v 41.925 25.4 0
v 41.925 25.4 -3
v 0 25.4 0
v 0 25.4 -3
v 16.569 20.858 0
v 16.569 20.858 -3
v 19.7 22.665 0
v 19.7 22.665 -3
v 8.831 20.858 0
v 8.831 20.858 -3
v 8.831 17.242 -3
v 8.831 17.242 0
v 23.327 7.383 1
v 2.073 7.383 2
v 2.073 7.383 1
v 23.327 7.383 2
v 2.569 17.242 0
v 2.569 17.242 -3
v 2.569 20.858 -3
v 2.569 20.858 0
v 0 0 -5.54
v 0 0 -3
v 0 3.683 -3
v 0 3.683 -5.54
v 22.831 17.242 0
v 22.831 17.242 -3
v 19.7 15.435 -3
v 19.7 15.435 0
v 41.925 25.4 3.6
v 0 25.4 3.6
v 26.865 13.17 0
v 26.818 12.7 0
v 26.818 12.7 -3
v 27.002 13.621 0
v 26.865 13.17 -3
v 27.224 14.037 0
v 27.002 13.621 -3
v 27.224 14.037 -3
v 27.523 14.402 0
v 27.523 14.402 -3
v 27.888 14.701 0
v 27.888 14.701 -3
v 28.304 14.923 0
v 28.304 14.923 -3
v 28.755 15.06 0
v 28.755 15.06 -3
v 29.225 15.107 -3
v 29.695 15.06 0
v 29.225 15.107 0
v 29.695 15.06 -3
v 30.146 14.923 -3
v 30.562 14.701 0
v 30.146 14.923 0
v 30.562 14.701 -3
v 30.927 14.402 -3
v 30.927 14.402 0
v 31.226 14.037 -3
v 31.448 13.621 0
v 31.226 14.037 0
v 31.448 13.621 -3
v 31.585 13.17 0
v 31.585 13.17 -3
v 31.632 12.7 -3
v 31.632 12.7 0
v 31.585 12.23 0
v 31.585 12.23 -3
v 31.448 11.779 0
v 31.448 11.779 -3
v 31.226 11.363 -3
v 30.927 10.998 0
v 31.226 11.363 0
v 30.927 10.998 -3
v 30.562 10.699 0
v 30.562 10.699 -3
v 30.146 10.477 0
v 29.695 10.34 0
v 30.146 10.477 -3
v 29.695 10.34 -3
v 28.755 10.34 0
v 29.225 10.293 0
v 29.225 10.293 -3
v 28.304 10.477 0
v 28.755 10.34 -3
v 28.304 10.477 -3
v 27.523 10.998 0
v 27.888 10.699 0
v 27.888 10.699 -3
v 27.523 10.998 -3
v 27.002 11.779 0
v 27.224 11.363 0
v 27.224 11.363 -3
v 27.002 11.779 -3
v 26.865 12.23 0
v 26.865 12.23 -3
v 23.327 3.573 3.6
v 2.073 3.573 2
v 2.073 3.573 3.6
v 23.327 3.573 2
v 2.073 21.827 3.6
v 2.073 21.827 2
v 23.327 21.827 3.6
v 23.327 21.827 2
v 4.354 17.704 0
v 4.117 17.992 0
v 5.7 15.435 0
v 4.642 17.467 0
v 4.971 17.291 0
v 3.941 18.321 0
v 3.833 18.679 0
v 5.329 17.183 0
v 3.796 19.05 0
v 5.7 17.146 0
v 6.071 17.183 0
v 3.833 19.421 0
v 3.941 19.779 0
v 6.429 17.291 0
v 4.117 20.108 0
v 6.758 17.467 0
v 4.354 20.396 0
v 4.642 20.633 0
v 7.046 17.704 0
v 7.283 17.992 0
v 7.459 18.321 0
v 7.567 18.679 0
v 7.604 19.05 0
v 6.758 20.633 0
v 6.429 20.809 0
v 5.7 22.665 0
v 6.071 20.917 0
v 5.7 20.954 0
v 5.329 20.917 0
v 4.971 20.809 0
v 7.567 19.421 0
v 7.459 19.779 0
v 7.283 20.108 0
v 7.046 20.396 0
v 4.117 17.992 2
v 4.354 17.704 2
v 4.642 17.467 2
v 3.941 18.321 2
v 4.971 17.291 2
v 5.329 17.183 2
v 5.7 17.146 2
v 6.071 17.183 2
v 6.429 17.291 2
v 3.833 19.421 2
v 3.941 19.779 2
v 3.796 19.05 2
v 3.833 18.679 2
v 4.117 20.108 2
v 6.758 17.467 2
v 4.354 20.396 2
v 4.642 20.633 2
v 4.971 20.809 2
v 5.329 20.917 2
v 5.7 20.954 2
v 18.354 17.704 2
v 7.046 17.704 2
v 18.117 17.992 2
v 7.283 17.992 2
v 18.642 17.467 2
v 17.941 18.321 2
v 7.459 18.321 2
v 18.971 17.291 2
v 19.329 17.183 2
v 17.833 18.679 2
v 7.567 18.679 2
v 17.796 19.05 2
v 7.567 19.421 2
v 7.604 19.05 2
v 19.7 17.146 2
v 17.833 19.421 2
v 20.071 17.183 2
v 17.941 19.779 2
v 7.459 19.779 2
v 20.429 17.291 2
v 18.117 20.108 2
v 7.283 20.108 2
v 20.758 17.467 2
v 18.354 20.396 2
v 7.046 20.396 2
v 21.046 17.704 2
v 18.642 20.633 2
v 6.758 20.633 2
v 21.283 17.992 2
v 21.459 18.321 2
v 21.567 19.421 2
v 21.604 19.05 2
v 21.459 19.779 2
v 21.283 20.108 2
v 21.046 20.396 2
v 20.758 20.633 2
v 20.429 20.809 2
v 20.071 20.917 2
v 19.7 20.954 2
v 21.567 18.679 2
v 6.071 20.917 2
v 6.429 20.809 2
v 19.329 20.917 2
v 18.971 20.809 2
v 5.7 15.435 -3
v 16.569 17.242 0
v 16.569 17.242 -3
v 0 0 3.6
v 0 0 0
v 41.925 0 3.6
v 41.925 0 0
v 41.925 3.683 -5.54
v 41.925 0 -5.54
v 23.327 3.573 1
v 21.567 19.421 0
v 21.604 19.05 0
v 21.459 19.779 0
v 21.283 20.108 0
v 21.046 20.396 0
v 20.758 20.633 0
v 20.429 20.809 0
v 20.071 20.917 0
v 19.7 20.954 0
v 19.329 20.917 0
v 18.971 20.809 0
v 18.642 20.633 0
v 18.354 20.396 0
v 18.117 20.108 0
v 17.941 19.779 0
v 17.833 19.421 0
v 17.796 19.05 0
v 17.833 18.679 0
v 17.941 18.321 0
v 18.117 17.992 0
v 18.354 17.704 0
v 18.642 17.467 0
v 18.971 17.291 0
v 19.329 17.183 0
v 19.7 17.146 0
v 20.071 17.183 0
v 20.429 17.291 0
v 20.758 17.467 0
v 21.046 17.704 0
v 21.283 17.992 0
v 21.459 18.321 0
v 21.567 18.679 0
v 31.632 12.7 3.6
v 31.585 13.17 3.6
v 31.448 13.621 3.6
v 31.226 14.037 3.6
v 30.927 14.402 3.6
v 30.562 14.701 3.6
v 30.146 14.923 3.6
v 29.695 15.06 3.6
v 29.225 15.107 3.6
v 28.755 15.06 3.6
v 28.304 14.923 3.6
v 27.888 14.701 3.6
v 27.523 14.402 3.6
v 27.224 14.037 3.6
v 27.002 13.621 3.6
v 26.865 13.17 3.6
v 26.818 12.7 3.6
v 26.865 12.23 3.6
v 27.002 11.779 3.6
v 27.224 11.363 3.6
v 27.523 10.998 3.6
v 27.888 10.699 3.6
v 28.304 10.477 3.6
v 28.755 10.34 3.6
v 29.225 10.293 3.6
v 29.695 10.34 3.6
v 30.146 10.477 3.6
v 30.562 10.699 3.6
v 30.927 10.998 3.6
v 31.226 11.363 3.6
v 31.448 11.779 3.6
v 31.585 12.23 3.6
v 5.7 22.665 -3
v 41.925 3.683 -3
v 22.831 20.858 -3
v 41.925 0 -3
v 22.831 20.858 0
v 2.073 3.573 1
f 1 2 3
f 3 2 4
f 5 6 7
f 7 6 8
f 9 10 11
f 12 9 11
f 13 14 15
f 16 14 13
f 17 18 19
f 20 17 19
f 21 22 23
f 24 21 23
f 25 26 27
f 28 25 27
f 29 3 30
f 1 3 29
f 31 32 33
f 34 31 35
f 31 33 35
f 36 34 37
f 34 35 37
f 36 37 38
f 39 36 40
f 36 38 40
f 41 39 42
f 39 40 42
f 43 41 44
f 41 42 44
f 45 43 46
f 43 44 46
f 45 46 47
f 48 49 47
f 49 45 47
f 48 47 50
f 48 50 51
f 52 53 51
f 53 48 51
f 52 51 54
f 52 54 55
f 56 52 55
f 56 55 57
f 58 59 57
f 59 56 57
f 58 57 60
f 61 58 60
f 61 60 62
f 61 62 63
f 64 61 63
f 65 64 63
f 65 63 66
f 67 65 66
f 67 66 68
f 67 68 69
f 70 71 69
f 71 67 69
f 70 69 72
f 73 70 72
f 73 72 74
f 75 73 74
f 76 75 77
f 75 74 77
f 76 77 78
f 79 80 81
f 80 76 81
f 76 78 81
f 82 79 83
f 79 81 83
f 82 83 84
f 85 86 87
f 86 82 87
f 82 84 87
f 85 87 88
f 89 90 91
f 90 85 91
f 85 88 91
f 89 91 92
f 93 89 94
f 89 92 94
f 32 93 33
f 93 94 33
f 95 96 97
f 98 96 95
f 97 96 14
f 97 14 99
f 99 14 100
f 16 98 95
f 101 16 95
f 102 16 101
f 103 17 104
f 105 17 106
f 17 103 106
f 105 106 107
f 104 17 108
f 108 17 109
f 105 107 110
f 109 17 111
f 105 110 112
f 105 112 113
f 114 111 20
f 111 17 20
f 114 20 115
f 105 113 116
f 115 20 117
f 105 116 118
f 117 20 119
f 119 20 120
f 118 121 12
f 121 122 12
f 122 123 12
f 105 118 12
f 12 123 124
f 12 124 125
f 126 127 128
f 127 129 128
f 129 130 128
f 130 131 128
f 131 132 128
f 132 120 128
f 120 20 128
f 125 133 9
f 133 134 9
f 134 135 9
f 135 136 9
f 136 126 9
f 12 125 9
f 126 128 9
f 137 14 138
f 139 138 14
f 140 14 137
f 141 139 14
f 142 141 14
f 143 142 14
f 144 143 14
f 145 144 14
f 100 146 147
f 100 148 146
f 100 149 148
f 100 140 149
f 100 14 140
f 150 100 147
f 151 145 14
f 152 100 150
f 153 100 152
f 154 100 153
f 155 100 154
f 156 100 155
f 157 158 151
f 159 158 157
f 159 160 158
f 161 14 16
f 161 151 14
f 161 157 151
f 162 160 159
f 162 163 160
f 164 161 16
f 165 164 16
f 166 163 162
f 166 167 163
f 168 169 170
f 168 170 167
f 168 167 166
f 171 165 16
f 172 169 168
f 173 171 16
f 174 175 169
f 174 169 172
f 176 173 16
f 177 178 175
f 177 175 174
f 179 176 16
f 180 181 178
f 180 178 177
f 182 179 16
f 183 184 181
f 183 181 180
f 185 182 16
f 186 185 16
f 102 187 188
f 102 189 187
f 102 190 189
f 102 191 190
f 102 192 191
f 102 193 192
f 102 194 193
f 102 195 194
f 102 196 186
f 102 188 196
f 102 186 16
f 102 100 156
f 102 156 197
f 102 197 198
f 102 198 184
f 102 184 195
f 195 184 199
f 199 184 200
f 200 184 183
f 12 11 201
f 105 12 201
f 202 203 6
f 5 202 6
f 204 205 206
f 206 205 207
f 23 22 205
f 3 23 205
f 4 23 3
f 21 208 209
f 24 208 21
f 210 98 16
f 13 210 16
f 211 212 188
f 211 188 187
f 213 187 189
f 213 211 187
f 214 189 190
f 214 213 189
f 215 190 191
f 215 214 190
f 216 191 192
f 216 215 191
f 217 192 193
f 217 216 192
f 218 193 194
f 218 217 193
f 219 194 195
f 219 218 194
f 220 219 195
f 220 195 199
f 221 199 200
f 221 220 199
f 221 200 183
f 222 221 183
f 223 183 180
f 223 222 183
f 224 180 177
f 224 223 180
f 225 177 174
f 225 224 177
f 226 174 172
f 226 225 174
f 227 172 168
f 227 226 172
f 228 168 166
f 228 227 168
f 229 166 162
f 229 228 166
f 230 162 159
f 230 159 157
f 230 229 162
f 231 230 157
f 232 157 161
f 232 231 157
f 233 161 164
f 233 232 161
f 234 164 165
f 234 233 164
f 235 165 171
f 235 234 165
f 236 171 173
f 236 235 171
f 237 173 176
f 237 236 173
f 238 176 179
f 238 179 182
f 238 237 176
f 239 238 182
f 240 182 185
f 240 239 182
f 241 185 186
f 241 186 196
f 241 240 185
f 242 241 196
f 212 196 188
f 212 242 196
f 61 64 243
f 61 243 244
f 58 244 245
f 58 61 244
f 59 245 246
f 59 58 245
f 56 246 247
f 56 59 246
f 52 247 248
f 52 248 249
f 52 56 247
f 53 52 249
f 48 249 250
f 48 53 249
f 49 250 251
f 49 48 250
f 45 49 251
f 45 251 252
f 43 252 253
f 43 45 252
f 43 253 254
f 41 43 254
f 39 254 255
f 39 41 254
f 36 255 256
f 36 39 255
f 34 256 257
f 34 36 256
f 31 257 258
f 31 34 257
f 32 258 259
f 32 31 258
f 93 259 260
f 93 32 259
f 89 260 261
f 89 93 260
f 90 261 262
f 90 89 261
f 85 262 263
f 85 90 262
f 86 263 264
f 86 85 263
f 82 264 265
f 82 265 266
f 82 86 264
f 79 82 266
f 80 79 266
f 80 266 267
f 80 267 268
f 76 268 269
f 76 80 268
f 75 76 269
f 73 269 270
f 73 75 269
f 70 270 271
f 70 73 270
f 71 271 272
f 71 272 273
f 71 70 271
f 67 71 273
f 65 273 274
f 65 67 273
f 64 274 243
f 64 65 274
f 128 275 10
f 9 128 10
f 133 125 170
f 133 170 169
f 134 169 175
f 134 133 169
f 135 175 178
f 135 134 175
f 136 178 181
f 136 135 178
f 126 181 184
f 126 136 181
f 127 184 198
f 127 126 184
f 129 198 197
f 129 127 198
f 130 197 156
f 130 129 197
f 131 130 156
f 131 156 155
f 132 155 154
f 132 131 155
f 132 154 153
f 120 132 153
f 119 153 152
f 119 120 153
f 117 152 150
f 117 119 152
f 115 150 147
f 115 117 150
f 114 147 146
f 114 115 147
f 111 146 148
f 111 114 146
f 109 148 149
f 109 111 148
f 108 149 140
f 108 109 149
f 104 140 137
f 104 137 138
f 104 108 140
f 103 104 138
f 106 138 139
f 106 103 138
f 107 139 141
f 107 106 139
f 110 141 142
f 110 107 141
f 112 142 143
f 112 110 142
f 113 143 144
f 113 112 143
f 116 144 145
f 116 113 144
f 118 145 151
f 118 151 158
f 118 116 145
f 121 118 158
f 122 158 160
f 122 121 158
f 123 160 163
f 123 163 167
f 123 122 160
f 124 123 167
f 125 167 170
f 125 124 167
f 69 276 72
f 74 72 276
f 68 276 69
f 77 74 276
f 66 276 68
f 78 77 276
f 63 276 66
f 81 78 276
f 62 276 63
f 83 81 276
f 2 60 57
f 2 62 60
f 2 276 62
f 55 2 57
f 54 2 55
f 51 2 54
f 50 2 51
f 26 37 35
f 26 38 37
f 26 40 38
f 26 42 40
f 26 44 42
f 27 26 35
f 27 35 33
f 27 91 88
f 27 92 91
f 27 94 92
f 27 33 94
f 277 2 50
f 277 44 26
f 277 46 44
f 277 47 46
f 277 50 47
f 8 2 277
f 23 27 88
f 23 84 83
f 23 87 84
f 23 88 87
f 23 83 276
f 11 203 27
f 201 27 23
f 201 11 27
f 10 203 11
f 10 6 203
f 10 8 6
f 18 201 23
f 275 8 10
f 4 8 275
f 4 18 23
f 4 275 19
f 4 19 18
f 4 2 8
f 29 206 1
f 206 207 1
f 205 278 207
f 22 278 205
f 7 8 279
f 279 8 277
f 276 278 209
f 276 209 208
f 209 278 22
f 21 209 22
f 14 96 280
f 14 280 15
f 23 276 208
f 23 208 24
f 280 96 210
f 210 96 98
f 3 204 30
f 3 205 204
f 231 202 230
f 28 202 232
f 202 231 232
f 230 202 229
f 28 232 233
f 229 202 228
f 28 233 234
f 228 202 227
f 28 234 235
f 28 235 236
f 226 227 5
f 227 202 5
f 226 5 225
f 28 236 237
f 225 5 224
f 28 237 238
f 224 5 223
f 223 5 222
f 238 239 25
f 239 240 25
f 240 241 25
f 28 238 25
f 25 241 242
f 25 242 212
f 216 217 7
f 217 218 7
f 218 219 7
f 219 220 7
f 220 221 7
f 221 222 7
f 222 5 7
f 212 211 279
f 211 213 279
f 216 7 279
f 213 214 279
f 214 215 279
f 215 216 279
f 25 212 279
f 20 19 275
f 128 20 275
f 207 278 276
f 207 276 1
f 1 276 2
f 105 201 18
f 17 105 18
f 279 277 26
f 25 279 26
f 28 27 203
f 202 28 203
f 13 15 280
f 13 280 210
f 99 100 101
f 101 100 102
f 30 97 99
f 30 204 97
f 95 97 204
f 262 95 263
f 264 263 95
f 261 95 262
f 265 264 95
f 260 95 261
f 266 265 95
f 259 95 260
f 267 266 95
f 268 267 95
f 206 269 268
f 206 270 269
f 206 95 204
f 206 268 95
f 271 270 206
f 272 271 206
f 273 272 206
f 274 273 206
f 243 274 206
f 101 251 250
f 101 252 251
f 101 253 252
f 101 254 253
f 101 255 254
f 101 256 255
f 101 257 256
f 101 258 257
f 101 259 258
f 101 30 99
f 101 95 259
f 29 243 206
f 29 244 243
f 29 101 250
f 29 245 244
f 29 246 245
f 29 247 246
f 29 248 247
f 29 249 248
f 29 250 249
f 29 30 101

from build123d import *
from build123d.topology import SkipClean

# Parameters (mm, degrees)
SKETCH1_W           = 41.925
SKETCH1_H           = 25.4
SKETCH1_R           = 1.9039967
SKETCH1_R_2         = 2.40665
BOSS_EXTRUDE1_DEPTH = 2
SKETCH2_W           = 41.925
SKETCH2_H           = 25.4
SKETCH2_R           = 2.40665
SKETCH2_W_2         = 21.254
SKETCH2_H_2         = 18.254
BOSS_EXTRUDE2_DEPTH = 1.6
BOSS_EXTRUDE3_START = 3
SKETCH3_W           = 41.925
SKETCH3_H           = 25.4
SKETCH3_R           = 2.40665
BOSS_EXTRUDE3_DEPTH = 3
SKETCH4_W           = 41.925
SKETCH4_H           = 3.683
BOSS_EXTRUDE4_DEPTH = 2.54
SKETCH5_W           = 21.254
SKETCH5_H           = 3.81
CUT_EXTRUDE1_DEPTH  = 1


with BuildPart() as part:
    # Sketch1 → Boss-Extrude1 (new body)
    with BuildSketch(Plane.XY):
        with Locations((20.9625, 12.7)):
            Rectangle(SKETCH1_W, SKETCH1_H)
        with Locations((5.7, 19.05)):
            Circle(SKETCH1_R, mode=Mode.SUBTRACT)
        with Locations((19.7, 19.05)):
            Circle(SKETCH1_R, mode=Mode.SUBTRACT)
        with Locations((29.225, 12.7)):
            Circle(SKETCH1_R_2, mode=Mode.SUBTRACT)
    extrude(amount=BOSS_EXTRUDE1_DEPTH)

    # Sketch2 → Boss-Extrude2 (add)
    with BuildSketch(Plane.XY.offset(2)):
        with Locations((20.9625, 12.7)):
            Rectangle(SKETCH2_W, SKETCH2_H)
        with Locations((29.225, 12.7)):
            Circle(SKETCH2_R, mode=Mode.SUBTRACT)
        with Locations((12.7, 12.7)):
            Rectangle(SKETCH2_W_2, SKETCH2_H_2, mode=Mode.SUBTRACT)
    extrude(amount=BOSS_EXTRUDE2_DEPTH)

    # Sketch3 → Boss-Extrude3 (add)
    with SkipClean():  # the faces are left unmerged after this step: merging them gives an invalid solid
        with BuildSketch(Plane(origin=(0, 0, 0), x_dir=(-1, 0, 0), z_dir=(0, 0, -1)).offset(BOSS_EXTRUDE3_START)):
            with Locations((-20.9625, 12.7)):
                Rectangle(SKETCH3_W, SKETCH3_H)
            with Locations((-29.225, 12.7)):
                Circle(SKETCH3_R, mode=Mode.SUBTRACT)
            Polygon((-16.5690055, 17.242319483), (-16.5690055, 20.857680517), (-19.7, 22.665361035), (-22.8309945, 20.857680517), (-22.8309945, 17.242319483), (-19.7, 15.434638965), align=None, mode=Mode.SUBTRACT)
            Polygon((-2.5690055, 20.857680517), (-5.7, 22.665361035), (-8.8309945, 20.857680517), (-8.8309945, 17.242319483), (-5.7, 15.434638965), (-2.5690055, 17.242319483), align=None, mode=Mode.SUBTRACT)
        extrude(amount=-BOSS_EXTRUDE3_DEPTH)

    # Sketch4 → Boss-Extrude4 (add)
    with SkipClean():  # the faces are left unmerged after this step: merging them gives an invalid solid
        with BuildSketch(Plane(origin=(0, 0, -3), x_dir=(-1, 0, 0), z_dir=(0, 0, -1))):
            with Locations((-20.9625, 1.8415)):
                Rectangle(SKETCH4_W, SKETCH4_H)
        extrude(amount=BOSS_EXTRUDE4_DEPTH)

    # Sketch5 → Cut-Extrude1 (cut)
    with SkipClean():  # the faces are left unmerged after this step: merging them gives an invalid solid
        with BuildSketch(Plane.XY.offset(2)):
            with Locations((12.7, 5.478)):
                Rectangle(SKETCH5_W, SKETCH5_H)
        extrude(amount=-CUT_EXTRUDE1_DEPTH, mode=Mode.SUBTRACT)


solid = part.part
